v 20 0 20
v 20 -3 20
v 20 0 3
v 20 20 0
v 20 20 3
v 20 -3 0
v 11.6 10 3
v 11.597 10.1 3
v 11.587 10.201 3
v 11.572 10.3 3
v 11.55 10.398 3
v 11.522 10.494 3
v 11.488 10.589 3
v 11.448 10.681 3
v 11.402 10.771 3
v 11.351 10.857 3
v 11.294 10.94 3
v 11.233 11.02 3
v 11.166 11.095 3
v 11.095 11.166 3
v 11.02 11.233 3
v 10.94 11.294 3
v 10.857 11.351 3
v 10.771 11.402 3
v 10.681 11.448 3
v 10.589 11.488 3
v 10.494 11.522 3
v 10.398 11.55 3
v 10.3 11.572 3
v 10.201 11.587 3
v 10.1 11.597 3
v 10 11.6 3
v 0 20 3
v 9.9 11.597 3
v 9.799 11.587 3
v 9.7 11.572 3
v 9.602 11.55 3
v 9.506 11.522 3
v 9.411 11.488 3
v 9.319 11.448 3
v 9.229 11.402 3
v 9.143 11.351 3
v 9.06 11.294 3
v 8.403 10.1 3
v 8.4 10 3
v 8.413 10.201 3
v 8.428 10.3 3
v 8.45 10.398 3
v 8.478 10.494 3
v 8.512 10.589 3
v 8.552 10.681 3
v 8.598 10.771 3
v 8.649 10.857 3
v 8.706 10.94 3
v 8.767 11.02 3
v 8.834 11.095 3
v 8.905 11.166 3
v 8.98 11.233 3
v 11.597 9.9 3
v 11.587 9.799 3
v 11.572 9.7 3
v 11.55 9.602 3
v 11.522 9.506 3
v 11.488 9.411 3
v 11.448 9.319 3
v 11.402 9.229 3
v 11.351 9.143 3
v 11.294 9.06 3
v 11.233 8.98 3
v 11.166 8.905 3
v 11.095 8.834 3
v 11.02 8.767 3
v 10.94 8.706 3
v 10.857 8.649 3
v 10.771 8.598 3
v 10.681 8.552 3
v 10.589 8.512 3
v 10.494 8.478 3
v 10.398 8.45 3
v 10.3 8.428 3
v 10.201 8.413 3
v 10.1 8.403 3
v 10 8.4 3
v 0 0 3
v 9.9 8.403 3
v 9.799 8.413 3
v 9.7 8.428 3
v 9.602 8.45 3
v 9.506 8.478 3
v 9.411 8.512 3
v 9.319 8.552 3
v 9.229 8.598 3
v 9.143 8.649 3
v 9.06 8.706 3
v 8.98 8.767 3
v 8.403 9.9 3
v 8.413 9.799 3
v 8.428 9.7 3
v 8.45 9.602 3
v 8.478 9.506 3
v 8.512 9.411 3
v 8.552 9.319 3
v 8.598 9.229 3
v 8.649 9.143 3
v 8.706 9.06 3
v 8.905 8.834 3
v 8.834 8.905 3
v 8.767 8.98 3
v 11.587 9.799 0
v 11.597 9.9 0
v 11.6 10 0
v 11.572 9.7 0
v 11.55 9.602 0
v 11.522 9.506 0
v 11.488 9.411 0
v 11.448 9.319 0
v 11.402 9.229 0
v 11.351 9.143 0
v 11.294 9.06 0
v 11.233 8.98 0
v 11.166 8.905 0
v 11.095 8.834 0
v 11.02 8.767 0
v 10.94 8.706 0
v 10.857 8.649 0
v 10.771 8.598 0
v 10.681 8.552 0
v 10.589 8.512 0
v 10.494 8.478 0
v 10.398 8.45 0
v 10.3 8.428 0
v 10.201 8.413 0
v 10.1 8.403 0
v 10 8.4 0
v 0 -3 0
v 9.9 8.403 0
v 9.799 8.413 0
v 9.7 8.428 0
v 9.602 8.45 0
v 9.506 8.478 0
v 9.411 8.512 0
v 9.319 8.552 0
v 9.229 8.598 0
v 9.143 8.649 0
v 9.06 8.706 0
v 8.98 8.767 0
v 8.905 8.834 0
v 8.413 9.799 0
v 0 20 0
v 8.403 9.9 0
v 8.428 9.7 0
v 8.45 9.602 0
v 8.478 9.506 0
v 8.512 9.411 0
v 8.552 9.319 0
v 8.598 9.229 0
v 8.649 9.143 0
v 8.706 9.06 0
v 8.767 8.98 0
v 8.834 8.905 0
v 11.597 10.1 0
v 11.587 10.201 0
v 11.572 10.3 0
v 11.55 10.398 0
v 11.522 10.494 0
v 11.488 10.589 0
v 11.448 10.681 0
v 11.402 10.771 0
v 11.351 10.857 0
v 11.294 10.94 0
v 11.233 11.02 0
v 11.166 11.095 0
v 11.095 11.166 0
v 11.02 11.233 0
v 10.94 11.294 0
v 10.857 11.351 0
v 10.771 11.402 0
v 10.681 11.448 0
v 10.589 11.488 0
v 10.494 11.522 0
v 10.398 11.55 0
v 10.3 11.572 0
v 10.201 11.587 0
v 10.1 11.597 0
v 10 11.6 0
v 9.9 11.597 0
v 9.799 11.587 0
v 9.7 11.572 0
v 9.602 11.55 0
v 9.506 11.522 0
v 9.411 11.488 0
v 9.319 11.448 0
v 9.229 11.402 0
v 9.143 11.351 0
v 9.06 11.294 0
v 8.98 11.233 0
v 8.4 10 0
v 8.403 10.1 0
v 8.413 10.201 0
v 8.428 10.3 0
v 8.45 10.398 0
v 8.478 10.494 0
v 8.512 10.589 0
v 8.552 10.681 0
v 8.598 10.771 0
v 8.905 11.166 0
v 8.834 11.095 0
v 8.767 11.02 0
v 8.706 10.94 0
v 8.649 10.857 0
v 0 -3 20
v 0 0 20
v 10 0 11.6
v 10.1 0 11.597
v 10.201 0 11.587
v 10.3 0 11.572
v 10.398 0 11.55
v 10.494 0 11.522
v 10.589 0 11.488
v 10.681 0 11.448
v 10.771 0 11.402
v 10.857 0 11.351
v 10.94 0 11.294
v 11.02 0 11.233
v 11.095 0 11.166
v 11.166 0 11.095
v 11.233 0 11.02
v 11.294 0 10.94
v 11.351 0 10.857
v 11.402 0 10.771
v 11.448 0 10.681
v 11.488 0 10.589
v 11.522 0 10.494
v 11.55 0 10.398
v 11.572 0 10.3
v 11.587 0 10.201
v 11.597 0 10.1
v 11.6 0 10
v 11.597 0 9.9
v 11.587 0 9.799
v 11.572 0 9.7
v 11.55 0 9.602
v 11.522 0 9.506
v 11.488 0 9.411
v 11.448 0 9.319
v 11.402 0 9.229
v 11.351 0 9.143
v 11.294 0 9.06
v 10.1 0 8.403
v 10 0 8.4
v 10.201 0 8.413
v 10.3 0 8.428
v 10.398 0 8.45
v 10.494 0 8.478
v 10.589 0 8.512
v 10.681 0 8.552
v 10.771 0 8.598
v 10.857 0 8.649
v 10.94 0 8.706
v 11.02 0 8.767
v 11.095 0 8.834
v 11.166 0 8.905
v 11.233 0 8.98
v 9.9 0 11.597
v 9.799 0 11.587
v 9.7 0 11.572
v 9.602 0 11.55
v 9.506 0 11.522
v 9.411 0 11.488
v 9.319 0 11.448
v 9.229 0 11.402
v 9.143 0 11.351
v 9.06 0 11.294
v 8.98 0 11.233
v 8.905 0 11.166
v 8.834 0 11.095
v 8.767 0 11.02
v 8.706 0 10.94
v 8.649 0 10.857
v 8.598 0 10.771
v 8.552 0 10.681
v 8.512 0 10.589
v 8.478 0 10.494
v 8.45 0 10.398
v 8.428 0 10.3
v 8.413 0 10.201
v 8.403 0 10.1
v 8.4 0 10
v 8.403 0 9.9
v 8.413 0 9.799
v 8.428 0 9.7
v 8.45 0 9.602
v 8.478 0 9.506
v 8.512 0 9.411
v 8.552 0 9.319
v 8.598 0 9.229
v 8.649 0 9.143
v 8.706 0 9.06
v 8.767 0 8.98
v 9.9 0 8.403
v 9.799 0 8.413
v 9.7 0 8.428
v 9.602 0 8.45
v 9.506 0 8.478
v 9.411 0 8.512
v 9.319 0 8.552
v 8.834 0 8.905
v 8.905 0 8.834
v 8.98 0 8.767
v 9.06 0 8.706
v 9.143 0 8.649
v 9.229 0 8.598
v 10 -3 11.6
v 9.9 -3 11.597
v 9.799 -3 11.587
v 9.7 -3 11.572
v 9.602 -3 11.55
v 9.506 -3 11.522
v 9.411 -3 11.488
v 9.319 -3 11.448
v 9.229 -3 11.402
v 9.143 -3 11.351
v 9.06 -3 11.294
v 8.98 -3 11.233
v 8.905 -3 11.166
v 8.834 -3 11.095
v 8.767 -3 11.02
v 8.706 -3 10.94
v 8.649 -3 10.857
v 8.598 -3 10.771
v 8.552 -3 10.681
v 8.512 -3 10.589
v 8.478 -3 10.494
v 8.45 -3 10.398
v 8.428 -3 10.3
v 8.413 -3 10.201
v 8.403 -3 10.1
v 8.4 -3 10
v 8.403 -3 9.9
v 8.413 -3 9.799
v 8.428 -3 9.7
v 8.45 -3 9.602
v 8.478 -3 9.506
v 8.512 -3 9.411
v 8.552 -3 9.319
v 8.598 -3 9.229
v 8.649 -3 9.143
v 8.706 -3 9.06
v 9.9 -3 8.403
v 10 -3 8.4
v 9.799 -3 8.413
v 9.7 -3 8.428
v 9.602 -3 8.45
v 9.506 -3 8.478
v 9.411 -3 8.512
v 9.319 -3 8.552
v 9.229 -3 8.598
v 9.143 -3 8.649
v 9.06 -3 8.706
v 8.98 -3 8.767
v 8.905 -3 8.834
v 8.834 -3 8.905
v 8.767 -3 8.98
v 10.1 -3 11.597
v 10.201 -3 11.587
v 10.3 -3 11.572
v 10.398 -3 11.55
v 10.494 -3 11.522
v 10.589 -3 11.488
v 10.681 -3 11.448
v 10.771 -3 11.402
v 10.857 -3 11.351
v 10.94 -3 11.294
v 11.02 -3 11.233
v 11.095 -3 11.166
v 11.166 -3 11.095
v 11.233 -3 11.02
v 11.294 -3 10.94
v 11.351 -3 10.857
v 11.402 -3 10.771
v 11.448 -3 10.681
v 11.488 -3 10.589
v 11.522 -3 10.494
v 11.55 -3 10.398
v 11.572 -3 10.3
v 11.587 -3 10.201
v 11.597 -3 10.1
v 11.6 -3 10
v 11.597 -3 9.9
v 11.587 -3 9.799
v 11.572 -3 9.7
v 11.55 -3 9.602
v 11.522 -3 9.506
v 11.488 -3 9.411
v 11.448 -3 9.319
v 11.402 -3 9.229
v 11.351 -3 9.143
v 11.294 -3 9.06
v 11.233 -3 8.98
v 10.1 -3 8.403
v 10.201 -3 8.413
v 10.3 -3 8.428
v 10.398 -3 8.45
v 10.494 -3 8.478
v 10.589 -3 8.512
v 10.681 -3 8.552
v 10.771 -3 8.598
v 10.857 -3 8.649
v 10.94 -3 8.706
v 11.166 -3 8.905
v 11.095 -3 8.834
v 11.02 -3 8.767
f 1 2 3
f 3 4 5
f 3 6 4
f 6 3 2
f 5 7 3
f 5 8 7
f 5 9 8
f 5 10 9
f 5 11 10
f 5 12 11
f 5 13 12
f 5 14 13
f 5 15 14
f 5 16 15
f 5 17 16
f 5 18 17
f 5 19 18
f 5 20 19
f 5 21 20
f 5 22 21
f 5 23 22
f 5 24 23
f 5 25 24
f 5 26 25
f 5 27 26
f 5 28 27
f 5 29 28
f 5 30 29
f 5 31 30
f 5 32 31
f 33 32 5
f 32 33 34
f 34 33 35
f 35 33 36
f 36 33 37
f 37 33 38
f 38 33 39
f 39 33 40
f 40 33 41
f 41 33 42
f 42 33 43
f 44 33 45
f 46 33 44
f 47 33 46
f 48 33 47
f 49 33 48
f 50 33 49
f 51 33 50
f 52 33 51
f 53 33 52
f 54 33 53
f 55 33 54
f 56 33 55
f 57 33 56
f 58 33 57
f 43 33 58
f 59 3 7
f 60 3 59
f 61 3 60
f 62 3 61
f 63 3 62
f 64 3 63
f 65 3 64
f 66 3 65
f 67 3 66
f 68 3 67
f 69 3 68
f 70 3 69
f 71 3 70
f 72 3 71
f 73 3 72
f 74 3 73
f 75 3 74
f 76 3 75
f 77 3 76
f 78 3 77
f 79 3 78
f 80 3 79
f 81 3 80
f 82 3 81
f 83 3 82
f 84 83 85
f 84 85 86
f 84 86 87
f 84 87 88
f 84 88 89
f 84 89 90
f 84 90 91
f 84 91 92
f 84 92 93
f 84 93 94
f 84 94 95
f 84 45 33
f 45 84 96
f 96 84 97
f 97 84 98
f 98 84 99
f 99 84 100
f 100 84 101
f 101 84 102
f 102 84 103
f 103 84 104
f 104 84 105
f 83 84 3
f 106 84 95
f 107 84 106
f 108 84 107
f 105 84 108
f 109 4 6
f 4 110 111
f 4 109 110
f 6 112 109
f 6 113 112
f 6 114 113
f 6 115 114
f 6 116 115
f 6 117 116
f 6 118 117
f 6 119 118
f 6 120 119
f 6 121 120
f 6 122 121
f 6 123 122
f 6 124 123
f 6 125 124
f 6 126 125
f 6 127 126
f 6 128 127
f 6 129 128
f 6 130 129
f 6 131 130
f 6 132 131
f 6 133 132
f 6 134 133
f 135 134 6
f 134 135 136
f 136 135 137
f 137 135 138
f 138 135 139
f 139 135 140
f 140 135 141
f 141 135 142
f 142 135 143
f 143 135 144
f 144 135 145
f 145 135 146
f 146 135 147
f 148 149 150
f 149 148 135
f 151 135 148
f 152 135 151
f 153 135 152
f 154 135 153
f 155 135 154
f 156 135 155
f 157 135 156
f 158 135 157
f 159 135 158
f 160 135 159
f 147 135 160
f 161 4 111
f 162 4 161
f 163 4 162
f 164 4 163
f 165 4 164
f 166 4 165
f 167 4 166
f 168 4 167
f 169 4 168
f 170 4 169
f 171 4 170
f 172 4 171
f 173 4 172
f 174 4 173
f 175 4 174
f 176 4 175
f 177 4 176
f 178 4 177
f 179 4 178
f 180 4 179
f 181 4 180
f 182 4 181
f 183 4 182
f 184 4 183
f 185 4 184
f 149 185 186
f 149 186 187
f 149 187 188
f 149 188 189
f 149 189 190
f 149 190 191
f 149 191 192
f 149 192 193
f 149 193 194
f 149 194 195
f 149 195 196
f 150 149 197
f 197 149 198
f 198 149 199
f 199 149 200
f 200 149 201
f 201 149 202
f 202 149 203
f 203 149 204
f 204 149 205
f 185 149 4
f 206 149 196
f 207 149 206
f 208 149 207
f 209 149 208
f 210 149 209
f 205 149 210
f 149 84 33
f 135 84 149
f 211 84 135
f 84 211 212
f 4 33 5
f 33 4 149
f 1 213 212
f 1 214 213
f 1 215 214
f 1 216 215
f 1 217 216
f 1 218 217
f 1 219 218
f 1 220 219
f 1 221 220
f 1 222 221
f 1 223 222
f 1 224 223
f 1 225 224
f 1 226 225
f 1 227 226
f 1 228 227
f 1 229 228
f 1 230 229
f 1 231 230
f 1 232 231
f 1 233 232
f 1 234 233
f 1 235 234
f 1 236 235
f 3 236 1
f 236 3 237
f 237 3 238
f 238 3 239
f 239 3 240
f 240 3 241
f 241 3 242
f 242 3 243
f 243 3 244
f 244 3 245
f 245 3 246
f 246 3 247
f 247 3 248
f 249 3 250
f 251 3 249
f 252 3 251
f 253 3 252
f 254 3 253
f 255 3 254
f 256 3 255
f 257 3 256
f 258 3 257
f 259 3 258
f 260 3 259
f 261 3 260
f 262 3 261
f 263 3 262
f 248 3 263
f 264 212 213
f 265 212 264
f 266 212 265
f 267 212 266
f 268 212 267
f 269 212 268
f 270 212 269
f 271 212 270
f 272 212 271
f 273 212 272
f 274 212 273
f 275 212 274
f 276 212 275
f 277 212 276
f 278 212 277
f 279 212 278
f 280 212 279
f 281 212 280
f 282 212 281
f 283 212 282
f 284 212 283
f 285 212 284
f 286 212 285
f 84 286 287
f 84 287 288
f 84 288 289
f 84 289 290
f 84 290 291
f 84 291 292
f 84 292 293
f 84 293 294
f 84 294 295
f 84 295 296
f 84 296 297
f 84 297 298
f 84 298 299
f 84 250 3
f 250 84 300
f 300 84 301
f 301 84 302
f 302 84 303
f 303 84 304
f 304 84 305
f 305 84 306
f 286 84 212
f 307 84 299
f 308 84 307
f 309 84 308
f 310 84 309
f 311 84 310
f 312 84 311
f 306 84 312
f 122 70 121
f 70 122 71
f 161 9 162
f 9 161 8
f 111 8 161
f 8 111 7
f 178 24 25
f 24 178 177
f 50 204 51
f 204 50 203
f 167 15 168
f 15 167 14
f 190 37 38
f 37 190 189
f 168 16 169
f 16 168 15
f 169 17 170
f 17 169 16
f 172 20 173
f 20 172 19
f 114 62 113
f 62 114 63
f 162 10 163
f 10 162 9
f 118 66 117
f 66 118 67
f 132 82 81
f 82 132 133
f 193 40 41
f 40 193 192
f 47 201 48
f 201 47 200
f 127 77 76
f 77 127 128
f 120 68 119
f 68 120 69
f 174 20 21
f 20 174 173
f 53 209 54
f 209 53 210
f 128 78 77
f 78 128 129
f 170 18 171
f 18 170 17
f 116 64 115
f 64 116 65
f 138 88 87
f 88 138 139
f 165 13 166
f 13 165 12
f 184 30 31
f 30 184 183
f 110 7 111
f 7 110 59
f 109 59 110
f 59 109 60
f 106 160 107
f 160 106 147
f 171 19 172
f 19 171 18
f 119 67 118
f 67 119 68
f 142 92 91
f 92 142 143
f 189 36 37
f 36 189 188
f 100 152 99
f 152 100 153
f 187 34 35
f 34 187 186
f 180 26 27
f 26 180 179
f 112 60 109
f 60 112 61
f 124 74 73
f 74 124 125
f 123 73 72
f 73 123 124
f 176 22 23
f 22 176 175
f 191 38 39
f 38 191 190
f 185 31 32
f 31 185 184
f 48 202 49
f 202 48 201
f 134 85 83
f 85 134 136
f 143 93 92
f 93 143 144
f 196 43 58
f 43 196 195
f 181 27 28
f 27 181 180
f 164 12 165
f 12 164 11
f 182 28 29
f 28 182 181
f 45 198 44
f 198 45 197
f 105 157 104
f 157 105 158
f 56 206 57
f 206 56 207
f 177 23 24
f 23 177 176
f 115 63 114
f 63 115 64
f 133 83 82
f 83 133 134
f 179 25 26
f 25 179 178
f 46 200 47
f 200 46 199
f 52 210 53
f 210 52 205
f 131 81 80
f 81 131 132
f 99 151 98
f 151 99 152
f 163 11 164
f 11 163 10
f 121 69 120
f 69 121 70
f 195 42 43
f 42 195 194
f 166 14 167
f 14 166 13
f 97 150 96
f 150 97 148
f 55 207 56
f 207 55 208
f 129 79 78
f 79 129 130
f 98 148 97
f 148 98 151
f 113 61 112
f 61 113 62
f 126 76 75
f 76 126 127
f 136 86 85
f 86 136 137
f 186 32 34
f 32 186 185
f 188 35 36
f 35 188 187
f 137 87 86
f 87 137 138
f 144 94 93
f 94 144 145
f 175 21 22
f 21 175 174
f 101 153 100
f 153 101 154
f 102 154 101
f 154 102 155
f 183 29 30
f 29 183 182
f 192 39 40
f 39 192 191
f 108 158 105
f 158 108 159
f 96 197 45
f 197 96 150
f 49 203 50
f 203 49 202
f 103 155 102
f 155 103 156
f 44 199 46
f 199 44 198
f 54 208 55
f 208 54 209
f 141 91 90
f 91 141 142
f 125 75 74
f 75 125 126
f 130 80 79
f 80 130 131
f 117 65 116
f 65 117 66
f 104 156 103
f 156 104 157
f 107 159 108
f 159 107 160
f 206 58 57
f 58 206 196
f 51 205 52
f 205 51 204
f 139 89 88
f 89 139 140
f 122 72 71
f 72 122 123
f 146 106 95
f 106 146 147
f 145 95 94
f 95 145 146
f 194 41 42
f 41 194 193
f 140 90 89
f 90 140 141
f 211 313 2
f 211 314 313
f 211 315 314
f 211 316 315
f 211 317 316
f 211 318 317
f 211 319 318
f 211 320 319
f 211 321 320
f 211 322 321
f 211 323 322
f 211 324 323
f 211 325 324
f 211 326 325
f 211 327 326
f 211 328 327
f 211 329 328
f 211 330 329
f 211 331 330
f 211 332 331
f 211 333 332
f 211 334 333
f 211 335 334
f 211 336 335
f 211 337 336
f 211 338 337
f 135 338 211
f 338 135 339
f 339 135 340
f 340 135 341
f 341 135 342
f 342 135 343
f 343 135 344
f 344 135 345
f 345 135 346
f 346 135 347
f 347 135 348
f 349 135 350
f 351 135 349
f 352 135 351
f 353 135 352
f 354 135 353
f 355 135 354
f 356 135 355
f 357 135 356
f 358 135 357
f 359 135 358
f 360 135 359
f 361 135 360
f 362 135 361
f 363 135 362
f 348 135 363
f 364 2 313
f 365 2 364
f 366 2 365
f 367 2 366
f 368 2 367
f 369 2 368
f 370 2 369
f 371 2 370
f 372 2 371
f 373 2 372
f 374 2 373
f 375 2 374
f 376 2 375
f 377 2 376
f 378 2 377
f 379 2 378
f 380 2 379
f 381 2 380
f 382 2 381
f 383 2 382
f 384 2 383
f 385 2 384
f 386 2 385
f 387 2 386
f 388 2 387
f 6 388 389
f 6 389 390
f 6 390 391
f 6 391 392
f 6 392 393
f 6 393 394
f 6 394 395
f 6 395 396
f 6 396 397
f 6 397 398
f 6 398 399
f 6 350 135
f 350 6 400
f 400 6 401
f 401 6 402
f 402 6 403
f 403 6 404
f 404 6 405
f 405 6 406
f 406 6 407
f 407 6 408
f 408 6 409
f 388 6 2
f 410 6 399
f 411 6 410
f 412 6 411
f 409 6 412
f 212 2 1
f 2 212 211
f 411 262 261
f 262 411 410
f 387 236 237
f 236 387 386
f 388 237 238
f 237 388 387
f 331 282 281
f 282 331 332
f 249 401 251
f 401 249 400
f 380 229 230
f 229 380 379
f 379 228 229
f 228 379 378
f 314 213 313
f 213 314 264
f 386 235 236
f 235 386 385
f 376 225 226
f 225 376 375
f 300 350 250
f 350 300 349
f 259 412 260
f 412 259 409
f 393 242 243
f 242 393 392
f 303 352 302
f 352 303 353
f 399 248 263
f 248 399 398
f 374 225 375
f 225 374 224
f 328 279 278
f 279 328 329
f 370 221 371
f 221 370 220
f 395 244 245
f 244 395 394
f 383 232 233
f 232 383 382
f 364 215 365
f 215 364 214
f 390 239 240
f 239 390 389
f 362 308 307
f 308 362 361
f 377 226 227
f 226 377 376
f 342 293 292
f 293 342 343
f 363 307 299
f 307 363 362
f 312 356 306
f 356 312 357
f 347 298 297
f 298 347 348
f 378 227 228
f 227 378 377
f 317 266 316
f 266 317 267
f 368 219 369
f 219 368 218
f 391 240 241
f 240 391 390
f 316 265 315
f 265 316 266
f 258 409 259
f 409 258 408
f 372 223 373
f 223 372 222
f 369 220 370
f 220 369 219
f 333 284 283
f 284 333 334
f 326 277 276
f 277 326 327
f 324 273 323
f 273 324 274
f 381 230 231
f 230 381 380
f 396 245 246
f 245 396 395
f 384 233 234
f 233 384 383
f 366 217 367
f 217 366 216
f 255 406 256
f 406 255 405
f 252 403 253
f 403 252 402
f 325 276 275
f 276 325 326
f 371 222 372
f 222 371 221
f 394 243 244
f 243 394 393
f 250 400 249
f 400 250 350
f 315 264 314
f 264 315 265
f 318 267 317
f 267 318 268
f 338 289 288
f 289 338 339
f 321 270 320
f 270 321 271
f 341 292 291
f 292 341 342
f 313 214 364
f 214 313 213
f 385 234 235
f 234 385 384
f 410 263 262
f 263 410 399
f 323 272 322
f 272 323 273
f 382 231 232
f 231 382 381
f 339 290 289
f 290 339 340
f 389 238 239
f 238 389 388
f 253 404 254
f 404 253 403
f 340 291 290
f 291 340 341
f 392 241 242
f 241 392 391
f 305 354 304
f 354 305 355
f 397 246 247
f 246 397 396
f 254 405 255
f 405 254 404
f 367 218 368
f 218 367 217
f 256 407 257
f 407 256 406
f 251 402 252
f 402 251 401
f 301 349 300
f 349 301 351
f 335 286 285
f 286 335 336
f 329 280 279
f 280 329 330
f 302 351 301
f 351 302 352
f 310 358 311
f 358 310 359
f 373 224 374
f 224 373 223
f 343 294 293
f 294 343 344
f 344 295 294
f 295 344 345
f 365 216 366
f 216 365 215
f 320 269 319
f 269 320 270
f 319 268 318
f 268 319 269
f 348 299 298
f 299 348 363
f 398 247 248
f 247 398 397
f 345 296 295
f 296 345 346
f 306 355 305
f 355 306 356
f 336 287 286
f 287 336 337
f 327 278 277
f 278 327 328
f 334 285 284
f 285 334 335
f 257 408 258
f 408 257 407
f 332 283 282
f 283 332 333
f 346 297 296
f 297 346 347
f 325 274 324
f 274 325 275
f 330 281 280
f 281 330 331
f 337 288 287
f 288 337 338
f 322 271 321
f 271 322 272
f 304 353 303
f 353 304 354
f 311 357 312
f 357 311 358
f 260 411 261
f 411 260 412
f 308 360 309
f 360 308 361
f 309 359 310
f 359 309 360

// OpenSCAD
/*for (i=[0,90]){
	
		difference(){
			cube([20,20,3]);
			translate([10,0,0]){cylinder(10,1.6,1.6,$fn=100);}
		}
	}
}#
*/
difference(){
			cube([20,20,3]);
			translate([10,10,0]){cylinder(10,1.6,1.6,$fn=100);}
		}

difference(){
			rotate([90,0,0]){cube([20,20,3]);}
			translate([10,0,10]){rotate([90,0,0]){cylinder(10,1.6,1.6,$fn=100);}
		}
}

//translate([10,0,10])rotate([90,0,0]){cylinder(10,1.6,1.6,$fn=100,true);
